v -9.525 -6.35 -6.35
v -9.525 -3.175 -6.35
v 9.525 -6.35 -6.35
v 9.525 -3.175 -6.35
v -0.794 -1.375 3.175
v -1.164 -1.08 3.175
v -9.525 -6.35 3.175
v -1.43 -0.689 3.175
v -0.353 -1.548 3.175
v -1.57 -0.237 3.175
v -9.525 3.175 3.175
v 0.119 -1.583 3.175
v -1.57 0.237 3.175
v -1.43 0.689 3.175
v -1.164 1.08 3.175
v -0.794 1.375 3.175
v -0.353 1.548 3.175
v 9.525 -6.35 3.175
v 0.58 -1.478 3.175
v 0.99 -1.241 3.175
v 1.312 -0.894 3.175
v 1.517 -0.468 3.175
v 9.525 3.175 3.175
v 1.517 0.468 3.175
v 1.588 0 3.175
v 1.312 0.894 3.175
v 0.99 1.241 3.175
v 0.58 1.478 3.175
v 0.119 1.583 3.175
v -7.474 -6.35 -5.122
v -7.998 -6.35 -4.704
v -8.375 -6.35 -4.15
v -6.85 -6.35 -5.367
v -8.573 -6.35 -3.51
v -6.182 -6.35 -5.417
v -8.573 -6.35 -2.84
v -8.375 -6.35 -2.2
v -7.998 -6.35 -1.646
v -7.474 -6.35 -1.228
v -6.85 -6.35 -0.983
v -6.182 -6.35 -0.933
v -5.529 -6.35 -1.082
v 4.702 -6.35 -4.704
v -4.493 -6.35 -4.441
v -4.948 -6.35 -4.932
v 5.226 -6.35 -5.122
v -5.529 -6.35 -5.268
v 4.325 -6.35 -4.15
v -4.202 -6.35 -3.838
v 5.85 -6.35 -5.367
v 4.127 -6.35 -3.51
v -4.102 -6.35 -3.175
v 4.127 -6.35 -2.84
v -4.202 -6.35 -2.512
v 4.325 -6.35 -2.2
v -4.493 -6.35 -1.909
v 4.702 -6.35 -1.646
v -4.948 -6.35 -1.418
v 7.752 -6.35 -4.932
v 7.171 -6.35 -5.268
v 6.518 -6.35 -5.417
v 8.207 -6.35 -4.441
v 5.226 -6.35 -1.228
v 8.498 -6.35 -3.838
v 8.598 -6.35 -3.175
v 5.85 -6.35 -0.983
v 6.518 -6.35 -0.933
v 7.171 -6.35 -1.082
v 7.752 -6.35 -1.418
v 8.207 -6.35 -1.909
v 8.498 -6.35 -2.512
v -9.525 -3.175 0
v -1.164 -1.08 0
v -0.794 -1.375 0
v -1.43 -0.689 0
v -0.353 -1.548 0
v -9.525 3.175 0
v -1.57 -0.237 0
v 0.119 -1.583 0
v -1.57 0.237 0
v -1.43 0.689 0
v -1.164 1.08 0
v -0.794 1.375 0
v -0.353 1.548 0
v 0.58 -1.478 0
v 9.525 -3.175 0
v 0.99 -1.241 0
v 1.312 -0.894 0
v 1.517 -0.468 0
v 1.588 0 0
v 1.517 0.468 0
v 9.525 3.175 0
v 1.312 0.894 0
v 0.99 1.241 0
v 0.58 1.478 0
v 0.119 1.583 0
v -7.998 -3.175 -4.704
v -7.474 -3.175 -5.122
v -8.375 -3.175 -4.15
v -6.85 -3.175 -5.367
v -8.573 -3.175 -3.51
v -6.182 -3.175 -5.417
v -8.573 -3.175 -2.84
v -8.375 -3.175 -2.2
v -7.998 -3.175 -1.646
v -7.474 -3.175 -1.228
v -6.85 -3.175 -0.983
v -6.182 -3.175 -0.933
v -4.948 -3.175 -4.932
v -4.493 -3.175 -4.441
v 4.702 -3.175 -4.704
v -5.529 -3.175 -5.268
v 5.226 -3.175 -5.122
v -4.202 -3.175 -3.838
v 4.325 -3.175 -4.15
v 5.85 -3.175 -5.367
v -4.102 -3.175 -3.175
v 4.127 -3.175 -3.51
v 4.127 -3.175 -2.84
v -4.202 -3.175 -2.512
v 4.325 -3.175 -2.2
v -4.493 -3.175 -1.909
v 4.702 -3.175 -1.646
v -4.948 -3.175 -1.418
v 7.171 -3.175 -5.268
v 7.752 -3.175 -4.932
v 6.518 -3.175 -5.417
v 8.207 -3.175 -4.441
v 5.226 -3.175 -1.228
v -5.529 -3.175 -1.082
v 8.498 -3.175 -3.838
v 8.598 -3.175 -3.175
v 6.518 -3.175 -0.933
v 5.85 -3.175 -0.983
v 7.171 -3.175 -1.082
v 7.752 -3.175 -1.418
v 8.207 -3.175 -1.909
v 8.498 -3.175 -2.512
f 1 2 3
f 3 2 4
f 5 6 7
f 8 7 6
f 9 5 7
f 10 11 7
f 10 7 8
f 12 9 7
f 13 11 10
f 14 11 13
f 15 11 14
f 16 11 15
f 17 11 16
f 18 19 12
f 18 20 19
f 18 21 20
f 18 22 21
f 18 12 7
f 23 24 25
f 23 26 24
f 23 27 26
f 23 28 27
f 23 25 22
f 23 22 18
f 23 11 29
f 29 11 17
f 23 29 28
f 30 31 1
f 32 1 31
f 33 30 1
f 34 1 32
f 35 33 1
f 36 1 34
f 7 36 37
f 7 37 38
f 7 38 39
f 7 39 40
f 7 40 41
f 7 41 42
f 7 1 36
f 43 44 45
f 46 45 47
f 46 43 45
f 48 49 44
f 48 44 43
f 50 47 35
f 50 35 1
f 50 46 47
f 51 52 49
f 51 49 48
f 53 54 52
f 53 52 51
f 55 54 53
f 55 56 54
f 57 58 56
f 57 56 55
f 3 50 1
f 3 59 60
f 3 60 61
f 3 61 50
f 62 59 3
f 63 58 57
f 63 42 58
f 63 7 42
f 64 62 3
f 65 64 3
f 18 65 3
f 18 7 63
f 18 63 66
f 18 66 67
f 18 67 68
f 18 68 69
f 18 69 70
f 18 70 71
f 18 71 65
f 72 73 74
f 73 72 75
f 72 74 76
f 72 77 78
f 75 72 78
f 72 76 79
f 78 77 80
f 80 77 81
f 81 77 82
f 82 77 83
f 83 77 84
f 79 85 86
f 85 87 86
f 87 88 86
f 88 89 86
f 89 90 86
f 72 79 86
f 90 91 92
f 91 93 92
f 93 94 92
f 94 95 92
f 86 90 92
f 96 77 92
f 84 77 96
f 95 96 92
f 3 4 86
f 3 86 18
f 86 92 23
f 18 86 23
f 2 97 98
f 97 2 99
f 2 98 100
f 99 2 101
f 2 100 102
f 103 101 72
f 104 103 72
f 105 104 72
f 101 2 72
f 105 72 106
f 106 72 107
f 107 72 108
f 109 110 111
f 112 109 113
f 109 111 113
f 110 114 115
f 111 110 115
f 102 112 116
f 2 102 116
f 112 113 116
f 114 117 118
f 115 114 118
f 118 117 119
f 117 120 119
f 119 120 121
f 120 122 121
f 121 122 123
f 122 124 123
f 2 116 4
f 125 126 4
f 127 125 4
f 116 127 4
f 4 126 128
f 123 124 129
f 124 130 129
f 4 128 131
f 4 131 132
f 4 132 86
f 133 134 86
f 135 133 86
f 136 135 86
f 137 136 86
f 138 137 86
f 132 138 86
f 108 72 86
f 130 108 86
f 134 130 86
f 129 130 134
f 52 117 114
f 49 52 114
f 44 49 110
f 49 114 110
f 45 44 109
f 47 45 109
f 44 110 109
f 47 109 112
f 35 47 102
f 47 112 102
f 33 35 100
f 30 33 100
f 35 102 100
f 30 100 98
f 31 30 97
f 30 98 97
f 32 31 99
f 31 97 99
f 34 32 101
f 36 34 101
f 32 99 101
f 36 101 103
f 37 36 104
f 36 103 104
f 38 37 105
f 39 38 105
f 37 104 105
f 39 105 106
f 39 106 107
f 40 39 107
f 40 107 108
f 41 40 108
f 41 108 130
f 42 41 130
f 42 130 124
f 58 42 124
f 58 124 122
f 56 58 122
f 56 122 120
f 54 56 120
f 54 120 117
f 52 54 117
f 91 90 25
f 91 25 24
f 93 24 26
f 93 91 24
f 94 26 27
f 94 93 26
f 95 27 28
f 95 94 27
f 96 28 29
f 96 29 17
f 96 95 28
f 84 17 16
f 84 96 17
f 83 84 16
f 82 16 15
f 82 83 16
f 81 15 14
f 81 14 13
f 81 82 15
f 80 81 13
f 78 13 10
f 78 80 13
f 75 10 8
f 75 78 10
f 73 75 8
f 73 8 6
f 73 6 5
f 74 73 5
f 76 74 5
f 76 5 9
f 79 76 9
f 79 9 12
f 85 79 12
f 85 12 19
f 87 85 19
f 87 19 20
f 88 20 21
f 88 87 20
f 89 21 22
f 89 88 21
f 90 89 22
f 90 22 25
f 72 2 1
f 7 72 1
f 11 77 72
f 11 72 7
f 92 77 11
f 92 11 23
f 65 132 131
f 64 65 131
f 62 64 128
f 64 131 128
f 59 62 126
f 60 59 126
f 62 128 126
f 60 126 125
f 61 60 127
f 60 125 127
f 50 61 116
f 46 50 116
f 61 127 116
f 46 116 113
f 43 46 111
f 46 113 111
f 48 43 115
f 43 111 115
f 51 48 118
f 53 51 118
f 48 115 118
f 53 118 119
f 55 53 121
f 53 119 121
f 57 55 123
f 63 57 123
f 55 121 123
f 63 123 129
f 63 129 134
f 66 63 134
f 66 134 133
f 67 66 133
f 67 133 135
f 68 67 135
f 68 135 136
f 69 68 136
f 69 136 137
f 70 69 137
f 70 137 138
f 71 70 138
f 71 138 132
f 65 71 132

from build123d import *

# Parameters (mm, degrees)
SKETCH1_W             = 19.05
SKETCH1_H             = 6.35
SKETCH1_R             = 1.5875
BOSS_EXTRUDE1_DEPTH   = 3.175
SKETCH2_W             = 19.05
SKETCH2_H             = 9.525
BOSS_EXTRUDE2_DEPTH   = 3.175
F_8_CLEARANCE_HOLE1_D = 4.4958


with BuildPart() as part:
    # Sketch1 → Boss-Extrude1 (new body)
    with BuildSketch(Plane.XY):
        Rectangle(SKETCH1_W, SKETCH1_H)
        Circle(SKETCH1_R, mode=Mode.SUBTRACT)
    extrude(amount=BOSS_EXTRUDE1_DEPTH)

    # Sketch2 → Boss-Extrude2 (add)
    with BuildSketch(Plane.XZ.offset(3.175)):
        with Locations((0, -1.5875)):
            Rectangle(SKETCH2_W, SKETCH2_H)
    extrude(amount=BOSS_EXTRUDE2_DEPTH)

    # #8 Clearance Hole1 (through all)
    with Locations(Plane(origin=(0, -6.35, 0), x_dir=(-1, 0, 0), z_dir=(0, -1, 0))):
        with Locations((-6.35, 3.175), (6.35, 3.175)):
            Hole(F_8_CLEARANCE_HOLE1_D / 2)


solid = part.part
